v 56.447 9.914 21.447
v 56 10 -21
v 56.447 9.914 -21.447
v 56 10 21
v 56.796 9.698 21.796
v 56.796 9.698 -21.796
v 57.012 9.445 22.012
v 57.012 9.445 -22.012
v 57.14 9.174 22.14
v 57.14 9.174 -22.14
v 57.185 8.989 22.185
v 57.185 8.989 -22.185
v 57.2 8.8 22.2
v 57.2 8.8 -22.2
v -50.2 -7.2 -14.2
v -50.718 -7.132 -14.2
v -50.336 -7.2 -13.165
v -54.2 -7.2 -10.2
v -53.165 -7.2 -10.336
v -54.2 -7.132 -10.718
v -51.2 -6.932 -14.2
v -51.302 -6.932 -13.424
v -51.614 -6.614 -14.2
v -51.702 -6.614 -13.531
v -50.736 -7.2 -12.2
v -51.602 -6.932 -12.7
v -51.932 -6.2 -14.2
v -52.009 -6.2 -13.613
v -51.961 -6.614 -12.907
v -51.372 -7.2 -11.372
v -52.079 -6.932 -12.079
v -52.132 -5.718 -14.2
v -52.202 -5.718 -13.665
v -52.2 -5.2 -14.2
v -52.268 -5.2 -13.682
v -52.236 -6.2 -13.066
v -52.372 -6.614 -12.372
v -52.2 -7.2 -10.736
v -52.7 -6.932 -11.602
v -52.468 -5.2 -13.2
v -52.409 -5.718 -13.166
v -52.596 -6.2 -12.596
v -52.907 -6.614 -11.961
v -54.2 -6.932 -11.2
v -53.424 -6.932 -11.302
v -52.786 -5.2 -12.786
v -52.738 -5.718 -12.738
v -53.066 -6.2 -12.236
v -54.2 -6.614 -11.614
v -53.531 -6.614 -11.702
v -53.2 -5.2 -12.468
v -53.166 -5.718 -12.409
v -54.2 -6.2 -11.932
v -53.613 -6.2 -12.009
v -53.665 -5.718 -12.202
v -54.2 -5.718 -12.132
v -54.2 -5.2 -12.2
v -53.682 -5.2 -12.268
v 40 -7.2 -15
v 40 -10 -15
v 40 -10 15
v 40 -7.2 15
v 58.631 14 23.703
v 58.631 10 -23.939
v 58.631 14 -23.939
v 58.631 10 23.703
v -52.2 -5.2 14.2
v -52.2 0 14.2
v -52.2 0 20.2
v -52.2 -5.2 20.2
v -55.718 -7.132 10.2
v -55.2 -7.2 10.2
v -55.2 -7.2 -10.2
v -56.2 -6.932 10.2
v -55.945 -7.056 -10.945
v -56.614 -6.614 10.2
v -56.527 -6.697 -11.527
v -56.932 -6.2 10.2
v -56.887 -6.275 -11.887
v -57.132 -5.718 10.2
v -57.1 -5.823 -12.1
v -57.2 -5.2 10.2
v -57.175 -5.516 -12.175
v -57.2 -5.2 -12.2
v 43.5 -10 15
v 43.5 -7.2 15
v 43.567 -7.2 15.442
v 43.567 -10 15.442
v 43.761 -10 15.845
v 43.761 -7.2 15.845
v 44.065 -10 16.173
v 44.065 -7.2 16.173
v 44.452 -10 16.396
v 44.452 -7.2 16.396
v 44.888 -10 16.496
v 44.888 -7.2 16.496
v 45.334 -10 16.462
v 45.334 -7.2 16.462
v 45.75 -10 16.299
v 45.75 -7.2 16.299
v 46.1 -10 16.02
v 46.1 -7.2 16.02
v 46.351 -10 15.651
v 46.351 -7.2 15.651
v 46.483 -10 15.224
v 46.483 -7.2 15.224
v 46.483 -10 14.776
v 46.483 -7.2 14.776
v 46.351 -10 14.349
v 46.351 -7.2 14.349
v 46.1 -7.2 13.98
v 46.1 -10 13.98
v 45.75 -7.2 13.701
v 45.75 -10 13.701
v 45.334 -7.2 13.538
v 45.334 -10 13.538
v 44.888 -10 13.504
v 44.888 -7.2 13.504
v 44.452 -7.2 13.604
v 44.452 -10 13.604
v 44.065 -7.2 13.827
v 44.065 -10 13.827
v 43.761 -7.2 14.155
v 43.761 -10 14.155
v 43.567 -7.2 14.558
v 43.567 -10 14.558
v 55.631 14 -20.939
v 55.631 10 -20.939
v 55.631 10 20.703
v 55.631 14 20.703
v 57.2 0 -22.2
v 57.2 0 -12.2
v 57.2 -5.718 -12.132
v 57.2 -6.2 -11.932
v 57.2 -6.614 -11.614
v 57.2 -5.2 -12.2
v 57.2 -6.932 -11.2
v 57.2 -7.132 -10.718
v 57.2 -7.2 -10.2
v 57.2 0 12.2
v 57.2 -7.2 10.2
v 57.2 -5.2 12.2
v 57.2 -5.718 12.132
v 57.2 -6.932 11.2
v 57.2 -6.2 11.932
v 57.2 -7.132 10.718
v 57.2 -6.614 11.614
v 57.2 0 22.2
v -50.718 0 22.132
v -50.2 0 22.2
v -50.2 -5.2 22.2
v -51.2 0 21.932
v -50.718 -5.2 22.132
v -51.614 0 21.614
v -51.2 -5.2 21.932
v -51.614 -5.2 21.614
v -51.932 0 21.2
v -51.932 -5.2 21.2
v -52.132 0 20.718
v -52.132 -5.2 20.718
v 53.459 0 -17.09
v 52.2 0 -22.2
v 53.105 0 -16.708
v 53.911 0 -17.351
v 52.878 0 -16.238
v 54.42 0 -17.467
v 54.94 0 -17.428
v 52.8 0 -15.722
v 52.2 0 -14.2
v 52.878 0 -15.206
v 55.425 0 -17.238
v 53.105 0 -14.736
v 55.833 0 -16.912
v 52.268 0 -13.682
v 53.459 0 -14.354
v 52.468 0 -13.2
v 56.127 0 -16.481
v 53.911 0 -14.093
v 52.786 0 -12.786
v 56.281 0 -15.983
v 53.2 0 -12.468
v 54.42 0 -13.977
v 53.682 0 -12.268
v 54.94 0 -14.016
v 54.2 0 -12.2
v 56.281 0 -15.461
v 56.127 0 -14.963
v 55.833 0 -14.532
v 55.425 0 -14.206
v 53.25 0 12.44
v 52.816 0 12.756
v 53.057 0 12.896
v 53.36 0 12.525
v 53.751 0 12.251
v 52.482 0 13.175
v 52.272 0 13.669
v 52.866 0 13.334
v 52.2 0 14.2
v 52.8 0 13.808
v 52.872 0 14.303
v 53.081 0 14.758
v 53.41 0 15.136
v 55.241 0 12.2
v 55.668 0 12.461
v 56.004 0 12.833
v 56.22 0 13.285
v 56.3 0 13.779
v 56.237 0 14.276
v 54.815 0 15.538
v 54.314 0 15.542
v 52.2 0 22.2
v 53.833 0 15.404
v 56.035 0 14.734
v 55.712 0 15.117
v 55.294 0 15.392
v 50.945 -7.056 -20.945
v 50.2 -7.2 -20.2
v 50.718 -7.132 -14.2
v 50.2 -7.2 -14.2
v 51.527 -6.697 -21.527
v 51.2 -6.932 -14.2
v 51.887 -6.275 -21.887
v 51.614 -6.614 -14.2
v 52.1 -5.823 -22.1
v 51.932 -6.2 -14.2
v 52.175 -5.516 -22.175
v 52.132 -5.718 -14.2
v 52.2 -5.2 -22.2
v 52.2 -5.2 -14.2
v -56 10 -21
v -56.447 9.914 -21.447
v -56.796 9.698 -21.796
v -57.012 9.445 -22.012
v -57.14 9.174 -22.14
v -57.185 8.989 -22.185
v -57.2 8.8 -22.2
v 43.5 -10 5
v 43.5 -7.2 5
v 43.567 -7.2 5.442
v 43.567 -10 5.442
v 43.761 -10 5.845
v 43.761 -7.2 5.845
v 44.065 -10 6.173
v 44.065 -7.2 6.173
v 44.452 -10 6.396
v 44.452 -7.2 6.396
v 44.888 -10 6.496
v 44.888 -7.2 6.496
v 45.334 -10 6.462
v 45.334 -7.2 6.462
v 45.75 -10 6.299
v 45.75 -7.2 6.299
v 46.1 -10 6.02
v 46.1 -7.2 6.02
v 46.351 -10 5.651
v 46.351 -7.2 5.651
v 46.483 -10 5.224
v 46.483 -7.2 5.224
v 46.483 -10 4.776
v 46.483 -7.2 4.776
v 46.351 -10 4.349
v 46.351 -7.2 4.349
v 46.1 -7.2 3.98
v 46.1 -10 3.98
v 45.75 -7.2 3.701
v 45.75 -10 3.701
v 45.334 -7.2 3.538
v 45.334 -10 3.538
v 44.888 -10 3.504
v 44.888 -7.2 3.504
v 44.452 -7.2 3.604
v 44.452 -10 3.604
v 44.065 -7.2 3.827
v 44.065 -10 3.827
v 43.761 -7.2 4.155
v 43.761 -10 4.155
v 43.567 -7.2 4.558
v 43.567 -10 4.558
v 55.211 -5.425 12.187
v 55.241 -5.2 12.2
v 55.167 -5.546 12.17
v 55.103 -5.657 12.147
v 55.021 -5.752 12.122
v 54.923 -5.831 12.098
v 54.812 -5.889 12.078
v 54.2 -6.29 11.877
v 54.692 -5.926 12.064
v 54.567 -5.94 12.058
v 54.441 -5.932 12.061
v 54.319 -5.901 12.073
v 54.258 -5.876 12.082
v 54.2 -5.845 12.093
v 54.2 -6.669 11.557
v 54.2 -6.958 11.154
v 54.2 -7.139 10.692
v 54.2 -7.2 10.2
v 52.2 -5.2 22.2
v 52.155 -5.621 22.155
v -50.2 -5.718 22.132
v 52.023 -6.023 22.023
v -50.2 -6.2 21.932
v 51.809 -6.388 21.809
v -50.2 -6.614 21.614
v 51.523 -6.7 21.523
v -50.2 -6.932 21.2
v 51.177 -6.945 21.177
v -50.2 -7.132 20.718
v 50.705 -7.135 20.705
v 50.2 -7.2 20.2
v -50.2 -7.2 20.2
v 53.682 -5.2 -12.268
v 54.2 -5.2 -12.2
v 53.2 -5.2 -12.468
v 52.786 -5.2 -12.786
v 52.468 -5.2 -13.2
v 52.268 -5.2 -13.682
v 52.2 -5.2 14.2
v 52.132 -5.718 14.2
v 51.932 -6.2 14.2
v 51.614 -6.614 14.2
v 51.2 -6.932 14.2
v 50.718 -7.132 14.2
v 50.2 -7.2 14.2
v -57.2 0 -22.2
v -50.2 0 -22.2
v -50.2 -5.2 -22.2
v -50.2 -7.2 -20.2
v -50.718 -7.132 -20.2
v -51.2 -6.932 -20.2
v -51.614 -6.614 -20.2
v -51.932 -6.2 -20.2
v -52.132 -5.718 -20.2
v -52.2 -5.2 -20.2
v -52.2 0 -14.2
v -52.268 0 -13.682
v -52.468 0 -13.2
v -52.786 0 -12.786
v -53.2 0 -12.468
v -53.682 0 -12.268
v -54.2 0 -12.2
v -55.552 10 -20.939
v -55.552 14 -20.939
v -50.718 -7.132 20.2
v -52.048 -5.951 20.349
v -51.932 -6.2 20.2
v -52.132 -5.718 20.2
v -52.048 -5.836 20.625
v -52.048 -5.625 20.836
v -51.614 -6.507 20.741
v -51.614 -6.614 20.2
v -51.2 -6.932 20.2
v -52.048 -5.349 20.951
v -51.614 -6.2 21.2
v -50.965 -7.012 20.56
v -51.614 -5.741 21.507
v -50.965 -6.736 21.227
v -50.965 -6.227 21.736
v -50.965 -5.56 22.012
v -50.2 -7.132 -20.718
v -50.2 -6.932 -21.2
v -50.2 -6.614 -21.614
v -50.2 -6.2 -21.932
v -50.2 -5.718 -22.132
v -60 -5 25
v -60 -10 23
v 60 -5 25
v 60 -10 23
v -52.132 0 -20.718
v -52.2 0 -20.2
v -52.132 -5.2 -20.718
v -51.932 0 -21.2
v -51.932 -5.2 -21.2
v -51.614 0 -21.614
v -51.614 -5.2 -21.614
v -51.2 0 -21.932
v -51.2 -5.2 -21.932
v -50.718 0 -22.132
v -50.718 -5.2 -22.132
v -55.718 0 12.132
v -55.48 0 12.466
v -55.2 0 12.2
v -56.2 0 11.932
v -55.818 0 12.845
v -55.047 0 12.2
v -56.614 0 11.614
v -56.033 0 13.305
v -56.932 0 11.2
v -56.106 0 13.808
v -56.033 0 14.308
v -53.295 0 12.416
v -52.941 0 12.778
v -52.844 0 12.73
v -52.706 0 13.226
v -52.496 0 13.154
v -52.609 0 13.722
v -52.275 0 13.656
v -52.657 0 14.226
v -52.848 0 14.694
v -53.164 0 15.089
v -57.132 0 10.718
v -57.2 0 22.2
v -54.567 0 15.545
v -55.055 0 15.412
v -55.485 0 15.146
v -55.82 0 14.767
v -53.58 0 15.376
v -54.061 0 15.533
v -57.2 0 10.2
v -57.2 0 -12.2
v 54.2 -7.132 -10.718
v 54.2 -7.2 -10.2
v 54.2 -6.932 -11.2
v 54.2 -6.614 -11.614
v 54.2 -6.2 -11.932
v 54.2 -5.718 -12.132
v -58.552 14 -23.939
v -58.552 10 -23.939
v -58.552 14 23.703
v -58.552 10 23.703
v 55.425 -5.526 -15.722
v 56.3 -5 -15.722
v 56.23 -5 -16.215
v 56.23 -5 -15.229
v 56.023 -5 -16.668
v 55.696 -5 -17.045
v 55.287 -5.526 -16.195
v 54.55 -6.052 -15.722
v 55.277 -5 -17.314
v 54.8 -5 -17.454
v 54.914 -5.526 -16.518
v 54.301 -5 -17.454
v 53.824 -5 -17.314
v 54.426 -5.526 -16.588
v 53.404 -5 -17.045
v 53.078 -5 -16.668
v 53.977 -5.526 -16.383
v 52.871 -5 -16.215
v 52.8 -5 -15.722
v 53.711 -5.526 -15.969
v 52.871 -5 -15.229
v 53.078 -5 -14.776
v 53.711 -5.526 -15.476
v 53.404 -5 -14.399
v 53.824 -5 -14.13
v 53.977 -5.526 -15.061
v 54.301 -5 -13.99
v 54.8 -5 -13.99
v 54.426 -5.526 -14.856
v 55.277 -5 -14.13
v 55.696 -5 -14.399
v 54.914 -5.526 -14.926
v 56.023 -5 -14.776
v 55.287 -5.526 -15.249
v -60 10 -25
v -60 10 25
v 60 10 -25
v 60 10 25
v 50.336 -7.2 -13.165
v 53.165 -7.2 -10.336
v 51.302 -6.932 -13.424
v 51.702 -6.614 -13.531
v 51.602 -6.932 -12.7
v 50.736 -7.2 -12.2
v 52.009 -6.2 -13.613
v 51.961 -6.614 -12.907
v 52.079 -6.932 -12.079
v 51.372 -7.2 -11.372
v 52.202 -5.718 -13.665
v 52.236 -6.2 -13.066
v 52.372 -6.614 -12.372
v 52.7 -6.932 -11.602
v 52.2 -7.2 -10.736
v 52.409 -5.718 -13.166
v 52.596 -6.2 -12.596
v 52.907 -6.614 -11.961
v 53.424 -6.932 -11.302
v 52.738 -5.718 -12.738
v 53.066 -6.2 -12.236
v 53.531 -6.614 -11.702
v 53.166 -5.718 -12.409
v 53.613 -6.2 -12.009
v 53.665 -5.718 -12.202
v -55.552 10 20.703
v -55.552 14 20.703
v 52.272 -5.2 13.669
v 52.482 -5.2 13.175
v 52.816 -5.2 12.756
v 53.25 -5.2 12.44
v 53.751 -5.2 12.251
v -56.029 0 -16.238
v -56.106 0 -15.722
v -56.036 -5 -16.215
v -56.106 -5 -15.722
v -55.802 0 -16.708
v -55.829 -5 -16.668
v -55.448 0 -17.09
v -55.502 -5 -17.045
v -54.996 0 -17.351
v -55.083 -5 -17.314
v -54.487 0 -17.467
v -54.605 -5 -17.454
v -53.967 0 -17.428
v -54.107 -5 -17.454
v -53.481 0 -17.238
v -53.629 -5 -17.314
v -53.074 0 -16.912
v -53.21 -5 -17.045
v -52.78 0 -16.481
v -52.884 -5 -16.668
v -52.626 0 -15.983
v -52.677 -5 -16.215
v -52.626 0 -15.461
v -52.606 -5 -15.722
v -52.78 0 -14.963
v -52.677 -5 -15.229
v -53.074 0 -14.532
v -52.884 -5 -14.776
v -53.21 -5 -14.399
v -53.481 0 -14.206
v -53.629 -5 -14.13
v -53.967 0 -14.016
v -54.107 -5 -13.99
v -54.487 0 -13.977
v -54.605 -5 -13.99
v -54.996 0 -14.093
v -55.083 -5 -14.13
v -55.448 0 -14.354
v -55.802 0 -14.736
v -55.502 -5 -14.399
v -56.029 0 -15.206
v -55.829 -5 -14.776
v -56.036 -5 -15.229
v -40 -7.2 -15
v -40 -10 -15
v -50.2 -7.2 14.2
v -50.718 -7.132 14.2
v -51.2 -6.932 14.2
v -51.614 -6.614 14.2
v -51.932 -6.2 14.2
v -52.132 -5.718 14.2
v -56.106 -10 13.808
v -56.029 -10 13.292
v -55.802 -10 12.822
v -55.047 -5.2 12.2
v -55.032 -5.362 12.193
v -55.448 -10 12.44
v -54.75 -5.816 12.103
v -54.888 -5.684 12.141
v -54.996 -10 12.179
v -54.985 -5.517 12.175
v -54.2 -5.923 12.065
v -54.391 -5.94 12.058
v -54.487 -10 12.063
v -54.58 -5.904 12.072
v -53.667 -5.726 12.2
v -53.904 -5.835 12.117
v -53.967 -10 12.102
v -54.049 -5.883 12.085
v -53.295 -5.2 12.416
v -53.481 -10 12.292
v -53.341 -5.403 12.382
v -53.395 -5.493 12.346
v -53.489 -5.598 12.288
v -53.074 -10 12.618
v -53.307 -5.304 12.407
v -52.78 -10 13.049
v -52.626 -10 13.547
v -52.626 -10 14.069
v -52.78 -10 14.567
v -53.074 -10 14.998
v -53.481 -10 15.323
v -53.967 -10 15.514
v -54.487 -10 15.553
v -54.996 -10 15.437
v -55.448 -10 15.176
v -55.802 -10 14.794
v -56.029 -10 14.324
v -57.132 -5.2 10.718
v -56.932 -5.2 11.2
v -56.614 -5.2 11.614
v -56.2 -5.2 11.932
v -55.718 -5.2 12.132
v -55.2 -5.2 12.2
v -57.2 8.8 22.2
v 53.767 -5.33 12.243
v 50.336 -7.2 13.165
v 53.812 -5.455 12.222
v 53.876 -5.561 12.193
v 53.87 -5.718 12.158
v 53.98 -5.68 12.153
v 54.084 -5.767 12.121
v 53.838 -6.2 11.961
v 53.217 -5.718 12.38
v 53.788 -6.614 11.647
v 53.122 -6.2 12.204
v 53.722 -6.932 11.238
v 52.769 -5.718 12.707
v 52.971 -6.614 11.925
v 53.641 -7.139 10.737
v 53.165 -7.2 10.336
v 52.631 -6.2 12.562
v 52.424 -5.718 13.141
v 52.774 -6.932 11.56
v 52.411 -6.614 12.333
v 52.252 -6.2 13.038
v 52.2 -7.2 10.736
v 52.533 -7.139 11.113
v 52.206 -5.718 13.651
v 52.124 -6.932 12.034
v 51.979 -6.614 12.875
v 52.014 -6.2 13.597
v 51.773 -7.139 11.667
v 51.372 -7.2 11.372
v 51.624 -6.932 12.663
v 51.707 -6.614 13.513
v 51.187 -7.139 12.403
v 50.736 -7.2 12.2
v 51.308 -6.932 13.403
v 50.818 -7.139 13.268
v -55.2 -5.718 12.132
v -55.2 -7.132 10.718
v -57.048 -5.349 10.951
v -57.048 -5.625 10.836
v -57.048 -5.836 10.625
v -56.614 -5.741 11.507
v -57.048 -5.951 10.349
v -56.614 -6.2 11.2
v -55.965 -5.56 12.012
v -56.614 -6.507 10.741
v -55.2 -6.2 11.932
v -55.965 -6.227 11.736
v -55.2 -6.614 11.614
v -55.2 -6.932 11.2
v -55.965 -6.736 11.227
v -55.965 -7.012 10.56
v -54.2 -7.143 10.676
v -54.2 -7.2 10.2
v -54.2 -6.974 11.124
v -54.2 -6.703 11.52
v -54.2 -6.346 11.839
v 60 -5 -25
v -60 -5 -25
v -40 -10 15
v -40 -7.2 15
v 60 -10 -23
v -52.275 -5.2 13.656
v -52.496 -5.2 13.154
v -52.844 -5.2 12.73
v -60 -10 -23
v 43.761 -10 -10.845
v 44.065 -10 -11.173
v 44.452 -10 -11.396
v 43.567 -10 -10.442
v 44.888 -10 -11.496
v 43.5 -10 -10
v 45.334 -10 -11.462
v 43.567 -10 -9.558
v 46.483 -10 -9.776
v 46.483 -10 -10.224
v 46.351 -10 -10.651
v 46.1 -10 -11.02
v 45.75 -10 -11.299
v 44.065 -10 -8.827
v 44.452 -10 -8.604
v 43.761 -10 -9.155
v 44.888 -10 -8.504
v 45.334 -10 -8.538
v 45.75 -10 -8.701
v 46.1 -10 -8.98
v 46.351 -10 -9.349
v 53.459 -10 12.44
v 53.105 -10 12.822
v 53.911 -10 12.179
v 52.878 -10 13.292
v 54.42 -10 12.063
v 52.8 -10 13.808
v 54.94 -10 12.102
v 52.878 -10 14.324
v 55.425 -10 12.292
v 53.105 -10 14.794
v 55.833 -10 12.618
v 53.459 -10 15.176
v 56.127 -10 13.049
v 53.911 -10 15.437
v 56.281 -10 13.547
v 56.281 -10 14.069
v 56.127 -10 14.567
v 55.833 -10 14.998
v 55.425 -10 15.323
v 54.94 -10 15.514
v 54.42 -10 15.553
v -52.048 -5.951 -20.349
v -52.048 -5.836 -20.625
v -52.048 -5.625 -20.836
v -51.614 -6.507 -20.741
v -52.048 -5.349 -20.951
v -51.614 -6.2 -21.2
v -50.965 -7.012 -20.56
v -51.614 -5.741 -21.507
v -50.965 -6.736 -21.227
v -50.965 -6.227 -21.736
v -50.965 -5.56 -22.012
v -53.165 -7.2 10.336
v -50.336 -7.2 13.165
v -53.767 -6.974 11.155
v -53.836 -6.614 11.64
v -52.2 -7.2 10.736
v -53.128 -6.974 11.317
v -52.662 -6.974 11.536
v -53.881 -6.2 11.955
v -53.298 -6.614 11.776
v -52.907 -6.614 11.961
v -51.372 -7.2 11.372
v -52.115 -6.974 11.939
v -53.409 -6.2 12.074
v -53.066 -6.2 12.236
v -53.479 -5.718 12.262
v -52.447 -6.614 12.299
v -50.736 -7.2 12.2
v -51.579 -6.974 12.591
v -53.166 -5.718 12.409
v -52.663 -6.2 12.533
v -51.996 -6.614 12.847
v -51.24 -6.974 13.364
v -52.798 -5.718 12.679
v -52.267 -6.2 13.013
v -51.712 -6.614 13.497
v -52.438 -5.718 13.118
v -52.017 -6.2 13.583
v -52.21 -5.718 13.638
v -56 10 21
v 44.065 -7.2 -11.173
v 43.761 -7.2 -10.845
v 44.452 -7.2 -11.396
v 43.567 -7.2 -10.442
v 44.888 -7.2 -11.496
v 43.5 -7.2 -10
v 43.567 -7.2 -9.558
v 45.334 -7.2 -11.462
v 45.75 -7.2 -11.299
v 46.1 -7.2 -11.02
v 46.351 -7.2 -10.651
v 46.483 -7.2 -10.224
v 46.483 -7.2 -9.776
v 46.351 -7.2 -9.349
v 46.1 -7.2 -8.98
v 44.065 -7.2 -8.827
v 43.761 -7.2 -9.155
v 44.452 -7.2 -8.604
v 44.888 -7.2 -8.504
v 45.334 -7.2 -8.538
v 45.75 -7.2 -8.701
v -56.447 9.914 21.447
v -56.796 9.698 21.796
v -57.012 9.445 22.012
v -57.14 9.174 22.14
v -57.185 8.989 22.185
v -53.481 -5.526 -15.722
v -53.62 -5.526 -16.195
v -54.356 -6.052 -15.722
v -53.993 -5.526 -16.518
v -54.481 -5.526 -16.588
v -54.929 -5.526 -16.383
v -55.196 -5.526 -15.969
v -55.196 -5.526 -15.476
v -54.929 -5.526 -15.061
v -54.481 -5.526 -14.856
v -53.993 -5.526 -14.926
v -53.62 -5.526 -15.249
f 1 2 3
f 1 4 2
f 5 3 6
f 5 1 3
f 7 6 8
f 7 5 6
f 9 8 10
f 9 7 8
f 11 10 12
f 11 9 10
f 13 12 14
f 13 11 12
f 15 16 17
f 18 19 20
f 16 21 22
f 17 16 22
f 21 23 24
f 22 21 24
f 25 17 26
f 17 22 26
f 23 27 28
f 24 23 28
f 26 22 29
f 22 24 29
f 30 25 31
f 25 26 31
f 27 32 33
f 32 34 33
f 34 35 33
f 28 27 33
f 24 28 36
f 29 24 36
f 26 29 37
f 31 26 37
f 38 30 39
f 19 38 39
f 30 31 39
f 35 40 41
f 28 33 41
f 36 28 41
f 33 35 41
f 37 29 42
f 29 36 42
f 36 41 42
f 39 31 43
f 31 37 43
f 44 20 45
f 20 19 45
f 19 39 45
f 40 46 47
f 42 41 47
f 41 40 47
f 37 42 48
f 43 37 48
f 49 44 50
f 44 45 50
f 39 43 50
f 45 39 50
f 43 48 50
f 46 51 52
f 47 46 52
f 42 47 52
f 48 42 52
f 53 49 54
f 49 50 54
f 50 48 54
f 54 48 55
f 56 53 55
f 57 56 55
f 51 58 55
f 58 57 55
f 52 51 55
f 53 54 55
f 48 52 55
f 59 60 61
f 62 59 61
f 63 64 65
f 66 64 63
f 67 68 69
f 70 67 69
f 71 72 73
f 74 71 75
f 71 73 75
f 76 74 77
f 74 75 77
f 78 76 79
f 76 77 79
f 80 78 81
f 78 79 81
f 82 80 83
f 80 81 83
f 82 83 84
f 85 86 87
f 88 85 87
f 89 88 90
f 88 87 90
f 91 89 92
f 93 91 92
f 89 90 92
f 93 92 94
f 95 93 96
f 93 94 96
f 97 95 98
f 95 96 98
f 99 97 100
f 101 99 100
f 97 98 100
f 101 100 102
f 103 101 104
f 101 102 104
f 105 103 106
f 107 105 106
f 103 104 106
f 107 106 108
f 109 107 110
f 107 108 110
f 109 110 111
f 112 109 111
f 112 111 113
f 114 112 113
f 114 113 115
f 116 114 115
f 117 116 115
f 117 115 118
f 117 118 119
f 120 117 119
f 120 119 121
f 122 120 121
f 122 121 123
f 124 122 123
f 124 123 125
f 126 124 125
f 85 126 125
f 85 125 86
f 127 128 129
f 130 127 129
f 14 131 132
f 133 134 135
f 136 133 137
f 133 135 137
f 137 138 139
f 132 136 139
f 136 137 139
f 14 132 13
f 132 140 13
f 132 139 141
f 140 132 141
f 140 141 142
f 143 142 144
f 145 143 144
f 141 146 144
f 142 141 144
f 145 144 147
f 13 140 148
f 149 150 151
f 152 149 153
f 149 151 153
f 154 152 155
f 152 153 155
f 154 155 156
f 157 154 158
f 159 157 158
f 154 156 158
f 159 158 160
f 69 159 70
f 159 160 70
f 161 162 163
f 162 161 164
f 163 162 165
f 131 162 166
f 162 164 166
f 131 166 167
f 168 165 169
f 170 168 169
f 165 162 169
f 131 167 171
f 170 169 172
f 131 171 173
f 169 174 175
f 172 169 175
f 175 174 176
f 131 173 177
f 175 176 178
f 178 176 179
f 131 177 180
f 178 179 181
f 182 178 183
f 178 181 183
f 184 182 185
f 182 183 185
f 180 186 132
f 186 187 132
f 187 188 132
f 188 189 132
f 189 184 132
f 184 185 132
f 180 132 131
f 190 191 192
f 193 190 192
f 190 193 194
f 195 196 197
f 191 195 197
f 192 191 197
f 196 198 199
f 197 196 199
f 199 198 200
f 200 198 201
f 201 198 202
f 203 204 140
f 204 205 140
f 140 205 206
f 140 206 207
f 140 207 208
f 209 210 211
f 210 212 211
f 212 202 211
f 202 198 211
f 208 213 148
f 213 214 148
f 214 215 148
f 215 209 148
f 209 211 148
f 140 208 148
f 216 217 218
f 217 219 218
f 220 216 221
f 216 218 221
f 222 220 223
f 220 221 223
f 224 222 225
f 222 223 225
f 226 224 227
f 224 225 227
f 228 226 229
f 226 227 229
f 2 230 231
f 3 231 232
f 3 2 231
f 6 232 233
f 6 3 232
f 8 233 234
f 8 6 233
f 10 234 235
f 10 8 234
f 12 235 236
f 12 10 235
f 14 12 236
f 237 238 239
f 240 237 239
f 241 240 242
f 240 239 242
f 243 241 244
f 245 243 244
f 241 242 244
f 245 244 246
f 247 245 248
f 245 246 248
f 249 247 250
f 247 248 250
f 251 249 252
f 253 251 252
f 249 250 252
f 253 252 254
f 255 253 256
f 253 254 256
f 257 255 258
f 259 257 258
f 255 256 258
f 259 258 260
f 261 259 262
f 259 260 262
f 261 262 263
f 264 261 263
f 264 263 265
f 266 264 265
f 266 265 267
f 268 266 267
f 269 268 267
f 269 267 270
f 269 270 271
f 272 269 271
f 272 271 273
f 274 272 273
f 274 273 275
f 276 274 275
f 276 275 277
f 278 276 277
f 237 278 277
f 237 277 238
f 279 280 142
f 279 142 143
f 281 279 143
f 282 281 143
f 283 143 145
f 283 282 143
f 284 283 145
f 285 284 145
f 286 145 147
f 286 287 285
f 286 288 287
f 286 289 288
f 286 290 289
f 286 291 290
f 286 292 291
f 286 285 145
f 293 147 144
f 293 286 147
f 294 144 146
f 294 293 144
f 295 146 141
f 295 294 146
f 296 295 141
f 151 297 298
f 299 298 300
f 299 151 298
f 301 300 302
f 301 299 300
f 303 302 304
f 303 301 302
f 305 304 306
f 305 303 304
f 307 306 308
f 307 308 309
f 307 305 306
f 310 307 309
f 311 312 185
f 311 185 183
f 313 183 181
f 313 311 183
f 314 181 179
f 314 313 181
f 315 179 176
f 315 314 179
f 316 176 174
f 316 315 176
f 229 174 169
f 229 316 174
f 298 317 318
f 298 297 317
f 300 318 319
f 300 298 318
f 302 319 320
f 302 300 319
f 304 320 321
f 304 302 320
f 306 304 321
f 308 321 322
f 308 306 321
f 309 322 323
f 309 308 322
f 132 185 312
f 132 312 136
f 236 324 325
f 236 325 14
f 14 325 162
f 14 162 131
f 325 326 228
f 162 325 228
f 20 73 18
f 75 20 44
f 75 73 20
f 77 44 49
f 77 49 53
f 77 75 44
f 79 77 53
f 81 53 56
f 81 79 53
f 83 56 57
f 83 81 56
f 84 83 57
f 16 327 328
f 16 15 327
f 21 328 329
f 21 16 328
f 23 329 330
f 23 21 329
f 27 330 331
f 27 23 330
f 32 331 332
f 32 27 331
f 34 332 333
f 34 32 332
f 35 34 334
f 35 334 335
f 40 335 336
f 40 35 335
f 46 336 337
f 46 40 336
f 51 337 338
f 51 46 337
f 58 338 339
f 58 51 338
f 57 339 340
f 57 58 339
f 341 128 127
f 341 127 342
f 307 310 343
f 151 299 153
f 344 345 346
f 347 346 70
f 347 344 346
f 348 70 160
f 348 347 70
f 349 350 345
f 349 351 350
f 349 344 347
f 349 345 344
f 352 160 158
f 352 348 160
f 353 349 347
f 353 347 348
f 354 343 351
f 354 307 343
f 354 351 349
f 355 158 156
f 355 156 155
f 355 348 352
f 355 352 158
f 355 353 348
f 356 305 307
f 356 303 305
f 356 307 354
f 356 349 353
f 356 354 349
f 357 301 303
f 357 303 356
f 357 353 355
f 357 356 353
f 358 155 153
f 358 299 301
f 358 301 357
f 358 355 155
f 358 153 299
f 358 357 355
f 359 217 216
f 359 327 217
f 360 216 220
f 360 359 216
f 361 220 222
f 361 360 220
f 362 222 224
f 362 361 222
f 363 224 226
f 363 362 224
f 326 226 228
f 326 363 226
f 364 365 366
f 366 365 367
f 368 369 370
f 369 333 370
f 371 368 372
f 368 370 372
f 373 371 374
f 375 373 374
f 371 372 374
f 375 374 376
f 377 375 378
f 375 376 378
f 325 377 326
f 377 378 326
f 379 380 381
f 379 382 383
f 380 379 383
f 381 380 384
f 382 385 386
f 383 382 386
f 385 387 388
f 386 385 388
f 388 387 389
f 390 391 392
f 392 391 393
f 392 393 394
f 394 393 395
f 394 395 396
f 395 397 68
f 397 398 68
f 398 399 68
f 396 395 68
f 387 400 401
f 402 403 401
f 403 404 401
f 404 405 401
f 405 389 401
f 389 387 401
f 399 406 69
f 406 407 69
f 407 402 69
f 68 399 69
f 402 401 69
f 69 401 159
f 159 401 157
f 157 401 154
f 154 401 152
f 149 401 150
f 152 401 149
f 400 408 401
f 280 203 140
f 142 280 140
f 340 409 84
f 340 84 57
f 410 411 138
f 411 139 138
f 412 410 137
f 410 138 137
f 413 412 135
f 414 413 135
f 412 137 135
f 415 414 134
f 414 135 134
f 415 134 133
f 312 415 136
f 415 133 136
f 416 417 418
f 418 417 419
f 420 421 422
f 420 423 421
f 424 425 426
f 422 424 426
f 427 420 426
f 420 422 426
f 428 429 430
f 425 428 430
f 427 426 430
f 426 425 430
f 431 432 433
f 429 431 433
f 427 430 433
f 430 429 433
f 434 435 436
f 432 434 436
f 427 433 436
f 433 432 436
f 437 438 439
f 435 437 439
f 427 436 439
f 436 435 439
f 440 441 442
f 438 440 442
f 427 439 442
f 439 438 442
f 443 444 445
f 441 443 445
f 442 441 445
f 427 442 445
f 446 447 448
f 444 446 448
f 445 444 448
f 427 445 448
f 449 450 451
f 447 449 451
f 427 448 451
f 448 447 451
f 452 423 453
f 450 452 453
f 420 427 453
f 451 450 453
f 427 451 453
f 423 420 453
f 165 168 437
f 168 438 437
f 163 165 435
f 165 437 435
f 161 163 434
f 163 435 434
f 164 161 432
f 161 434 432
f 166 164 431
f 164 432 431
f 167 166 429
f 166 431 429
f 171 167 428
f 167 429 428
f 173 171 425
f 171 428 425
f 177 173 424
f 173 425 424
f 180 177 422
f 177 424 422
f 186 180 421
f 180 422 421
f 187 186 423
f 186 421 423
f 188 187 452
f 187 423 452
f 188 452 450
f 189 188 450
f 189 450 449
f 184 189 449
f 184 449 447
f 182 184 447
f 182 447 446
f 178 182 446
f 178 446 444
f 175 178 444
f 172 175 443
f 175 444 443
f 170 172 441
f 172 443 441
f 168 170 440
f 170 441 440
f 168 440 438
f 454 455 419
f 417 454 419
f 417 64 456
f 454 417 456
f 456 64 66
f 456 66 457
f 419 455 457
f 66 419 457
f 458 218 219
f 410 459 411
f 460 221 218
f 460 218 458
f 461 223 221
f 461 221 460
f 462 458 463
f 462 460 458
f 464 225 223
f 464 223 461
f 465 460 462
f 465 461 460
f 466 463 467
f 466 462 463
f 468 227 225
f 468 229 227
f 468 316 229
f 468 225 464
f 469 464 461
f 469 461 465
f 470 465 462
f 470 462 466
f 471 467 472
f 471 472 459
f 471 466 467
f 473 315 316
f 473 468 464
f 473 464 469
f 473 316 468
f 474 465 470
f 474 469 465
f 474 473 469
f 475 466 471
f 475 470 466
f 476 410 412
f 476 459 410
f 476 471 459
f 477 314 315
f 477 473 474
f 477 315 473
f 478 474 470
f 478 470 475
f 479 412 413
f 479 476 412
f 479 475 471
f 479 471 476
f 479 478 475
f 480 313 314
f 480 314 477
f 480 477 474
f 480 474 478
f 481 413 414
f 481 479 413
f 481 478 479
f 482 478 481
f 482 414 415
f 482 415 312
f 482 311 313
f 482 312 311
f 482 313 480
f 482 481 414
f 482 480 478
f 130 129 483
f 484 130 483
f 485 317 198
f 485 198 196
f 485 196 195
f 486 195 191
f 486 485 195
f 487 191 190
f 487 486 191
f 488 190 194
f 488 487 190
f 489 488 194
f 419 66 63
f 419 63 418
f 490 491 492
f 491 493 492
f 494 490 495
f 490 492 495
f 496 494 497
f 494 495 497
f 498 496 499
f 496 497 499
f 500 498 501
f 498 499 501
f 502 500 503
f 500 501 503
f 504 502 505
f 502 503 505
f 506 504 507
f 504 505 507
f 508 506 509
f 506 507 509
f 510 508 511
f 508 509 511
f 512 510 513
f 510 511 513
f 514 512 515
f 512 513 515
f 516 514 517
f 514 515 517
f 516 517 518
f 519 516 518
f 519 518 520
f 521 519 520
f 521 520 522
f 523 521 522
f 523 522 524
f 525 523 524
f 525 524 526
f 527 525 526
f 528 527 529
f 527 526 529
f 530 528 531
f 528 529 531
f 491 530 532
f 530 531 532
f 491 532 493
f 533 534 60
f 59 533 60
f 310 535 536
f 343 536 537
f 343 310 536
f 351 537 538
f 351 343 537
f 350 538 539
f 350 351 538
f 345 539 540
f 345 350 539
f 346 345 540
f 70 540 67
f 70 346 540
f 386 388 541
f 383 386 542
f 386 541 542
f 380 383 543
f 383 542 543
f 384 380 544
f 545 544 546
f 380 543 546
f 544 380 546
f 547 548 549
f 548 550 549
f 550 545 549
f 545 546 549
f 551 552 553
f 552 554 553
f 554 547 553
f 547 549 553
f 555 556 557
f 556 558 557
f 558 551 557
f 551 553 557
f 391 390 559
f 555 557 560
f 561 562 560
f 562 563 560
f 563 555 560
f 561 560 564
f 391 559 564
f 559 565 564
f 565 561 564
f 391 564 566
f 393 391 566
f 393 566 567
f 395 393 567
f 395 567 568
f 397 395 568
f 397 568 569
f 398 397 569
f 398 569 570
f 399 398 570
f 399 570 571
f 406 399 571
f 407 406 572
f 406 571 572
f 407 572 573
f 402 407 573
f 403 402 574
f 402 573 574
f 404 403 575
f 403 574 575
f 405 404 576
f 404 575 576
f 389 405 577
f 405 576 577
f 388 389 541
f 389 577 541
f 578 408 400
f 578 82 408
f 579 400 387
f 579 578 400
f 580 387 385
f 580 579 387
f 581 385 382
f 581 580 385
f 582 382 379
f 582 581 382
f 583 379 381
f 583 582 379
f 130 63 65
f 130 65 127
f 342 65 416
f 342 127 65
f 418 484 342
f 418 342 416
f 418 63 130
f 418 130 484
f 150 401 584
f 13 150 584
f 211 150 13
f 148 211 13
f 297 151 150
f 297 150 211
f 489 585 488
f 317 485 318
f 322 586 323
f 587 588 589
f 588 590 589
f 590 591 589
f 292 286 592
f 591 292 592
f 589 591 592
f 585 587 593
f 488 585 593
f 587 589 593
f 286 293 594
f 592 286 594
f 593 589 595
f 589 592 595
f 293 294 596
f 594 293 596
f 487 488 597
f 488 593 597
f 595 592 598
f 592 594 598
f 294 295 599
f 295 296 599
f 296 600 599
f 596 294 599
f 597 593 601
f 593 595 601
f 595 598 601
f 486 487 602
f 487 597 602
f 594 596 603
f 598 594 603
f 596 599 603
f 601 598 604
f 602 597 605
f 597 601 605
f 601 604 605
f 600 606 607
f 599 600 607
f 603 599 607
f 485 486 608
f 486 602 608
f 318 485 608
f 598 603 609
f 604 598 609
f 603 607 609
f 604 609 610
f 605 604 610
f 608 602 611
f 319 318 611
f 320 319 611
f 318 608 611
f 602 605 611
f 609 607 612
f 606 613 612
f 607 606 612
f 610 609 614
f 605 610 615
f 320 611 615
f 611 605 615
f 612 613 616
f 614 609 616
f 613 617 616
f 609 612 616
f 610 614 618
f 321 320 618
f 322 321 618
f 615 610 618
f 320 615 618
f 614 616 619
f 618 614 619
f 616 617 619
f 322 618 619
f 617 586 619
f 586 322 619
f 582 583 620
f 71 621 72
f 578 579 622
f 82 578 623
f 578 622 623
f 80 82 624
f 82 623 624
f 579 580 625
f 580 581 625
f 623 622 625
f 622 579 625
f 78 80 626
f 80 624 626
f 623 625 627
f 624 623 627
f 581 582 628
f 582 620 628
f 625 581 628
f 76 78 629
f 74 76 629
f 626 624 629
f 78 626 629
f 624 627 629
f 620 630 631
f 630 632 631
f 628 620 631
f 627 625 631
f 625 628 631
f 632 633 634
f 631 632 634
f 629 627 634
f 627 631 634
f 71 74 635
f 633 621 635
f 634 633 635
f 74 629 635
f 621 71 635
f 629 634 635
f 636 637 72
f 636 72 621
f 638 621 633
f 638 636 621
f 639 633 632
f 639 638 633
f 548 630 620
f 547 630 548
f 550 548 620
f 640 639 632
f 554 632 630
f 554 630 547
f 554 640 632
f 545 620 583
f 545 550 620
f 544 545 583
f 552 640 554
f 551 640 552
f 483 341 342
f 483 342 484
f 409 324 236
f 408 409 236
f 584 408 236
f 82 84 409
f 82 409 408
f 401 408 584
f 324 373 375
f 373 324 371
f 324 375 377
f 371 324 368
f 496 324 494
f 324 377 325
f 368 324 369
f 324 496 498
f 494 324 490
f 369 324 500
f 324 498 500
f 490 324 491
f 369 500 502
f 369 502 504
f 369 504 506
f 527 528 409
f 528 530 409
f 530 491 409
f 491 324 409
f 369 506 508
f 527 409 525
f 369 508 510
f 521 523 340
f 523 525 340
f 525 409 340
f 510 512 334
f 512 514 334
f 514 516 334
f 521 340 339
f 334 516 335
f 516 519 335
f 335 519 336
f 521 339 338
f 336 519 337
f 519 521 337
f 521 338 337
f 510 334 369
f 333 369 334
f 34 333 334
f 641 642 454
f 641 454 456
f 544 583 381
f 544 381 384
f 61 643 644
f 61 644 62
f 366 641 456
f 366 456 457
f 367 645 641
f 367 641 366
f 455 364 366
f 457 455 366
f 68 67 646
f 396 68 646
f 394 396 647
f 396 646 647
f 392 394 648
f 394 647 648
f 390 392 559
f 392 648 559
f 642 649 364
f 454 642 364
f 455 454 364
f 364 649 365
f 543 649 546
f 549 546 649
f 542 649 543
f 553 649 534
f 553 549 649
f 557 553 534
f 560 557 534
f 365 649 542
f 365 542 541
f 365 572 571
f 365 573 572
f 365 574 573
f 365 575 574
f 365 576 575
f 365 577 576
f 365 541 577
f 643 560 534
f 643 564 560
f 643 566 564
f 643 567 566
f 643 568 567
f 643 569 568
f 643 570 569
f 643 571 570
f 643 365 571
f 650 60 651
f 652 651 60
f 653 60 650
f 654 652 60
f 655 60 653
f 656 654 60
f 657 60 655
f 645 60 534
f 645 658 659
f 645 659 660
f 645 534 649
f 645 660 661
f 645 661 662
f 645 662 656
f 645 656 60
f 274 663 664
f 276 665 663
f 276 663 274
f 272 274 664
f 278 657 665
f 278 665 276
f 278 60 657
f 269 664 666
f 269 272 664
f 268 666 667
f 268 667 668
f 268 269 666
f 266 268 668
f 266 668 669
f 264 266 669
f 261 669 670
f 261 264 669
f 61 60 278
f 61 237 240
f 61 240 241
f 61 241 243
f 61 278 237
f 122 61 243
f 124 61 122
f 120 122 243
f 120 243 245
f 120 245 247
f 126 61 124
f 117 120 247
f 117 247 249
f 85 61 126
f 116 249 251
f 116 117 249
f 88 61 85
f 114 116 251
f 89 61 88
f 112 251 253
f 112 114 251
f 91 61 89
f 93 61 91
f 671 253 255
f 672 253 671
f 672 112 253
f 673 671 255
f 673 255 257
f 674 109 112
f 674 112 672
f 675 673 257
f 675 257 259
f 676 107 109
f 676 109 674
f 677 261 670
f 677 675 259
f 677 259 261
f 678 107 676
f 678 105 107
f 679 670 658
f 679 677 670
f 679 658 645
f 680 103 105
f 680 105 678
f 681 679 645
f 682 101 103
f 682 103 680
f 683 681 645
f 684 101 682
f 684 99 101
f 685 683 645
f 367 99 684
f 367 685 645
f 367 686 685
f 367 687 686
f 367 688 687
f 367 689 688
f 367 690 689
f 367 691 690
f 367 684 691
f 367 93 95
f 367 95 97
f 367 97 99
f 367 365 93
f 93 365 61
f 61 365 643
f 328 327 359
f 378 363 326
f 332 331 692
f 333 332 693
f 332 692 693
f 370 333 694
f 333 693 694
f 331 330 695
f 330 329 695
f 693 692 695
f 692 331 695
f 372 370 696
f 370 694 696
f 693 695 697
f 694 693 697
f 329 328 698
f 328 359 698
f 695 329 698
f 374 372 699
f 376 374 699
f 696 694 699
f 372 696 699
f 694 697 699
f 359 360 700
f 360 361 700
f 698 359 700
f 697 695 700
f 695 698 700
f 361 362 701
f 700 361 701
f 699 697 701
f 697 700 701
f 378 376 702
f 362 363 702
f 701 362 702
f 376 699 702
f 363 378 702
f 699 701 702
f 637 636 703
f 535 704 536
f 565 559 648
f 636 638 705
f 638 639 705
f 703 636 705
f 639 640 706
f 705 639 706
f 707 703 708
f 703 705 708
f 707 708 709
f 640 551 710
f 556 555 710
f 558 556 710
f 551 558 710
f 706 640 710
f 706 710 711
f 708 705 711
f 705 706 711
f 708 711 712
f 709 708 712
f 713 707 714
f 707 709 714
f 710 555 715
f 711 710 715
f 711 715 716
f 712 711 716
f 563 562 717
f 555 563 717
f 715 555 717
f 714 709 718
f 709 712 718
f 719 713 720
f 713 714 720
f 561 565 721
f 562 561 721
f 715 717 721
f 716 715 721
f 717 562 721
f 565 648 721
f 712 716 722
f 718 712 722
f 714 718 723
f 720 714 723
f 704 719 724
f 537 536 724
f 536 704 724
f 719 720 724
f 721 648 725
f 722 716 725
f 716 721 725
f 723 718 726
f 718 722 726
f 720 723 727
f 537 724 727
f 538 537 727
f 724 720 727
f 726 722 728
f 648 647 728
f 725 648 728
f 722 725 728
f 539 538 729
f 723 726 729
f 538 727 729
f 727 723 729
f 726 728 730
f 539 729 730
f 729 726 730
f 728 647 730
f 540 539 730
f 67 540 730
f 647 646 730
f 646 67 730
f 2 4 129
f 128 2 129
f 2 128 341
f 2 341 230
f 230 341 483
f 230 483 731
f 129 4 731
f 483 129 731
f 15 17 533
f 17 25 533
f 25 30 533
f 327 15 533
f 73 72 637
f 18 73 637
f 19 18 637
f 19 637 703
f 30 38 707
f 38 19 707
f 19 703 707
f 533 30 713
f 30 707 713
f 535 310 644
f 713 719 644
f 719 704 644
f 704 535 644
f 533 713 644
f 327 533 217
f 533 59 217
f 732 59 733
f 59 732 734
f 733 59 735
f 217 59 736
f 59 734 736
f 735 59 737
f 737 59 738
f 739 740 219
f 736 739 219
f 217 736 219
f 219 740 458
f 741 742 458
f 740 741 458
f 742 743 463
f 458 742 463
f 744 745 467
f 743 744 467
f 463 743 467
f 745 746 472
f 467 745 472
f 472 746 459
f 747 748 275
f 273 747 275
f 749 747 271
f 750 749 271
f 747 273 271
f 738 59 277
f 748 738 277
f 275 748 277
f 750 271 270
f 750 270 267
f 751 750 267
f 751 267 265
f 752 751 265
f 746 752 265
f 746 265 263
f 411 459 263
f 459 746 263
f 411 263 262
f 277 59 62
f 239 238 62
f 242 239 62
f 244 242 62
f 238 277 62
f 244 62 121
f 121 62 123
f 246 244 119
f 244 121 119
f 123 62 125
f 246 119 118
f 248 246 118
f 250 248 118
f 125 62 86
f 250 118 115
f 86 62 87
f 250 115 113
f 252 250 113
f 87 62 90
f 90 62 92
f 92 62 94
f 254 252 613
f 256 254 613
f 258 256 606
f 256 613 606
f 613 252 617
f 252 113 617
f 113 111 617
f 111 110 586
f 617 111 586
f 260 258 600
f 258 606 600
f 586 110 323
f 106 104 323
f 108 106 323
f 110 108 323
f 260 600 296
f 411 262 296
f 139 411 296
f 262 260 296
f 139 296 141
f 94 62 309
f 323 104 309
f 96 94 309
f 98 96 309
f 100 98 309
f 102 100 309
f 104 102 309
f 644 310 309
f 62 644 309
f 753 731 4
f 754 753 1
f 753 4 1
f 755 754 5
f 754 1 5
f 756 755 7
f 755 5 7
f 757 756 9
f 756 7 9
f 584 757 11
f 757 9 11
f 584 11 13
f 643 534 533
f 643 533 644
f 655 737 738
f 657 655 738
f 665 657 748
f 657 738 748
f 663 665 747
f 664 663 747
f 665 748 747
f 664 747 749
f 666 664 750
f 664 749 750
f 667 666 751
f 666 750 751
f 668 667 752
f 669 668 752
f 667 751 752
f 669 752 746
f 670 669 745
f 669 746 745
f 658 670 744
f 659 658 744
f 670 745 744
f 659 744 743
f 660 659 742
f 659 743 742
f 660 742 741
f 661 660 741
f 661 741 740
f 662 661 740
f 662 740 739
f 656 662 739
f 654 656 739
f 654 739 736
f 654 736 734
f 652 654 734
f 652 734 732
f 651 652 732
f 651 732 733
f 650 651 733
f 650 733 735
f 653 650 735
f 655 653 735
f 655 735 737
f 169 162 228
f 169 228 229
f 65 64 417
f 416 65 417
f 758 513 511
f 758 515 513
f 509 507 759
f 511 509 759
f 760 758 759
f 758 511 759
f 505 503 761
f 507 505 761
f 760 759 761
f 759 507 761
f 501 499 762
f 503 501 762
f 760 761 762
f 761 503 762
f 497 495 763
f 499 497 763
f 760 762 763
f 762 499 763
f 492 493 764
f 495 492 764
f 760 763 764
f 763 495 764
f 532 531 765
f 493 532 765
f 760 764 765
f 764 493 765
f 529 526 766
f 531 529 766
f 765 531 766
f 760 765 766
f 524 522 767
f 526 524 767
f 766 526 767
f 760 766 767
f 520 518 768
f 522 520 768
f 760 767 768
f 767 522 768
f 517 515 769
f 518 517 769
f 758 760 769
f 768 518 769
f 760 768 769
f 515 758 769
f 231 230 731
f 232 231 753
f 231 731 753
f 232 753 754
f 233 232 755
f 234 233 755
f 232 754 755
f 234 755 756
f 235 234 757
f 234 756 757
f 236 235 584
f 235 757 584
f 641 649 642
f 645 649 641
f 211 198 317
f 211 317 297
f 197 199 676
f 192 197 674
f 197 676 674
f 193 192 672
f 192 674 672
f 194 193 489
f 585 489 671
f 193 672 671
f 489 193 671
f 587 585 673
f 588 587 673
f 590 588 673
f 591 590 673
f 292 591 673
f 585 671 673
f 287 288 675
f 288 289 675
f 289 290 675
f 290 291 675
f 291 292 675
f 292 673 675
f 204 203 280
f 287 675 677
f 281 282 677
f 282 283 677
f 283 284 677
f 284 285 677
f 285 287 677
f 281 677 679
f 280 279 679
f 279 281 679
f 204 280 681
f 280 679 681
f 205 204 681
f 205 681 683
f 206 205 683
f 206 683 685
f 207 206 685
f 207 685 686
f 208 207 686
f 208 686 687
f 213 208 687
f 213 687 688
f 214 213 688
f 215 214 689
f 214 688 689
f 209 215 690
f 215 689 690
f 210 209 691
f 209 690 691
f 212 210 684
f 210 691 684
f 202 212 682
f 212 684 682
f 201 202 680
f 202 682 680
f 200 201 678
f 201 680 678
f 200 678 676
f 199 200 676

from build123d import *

# Parameters (mm, degrees)
F0_W          = 120
F0_H          = 50
F1_DEPTH      = 10
F1_DEPTH_BACK = 10
F2_T          = -2.8
F3_W          = 80
F3_H          = 30
F4_DEPTH      = 20.001
F6_W          = 5
F6_H          = 10
F7_DEPTH      = 7.2
F8_F1_R       = 2
F8_F2_R       = 2
F9_SIZE2      = 2
F9_SIZE       = 5
F9_2_SIZE2    = 2
F9_2_SIZE     = 5
F10_D         = 3
F12_D         = 3.5
F12_DEPTH     = 5
F12_START     = 5.9405501
F12_TIP       = 1.0515060833
F13_W         = 117.182782799
F13_H         = 47.6424540132
F13_W_2       = 111.182782799
F13_H_2       = 41.6424540132
F14_DEPTH     = 4
F15_R         = 1.2


with BuildPart() as f1:
    # F0 (on Front) → F1 (new body, two sides)
    with BuildSketch(Plane.XZ) as f1_sk:
        Rectangle(F0_W, F0_H)
    extrude(amount=F1_DEPTH)
    extrude(f1_sk.sketch, amount=-F1_DEPTH_BACK)

    # F2
    f2_openings = [f1.faces().sort_by_distance(p)[0] for p in [
        (0, 10, 0),
    ]]
    offset(amount=F2_T, openings=f2_openings)

    # F3 (on face) → F4 (cut, through all)
    with BuildSketch(Plane.XZ.offset(10)):
        Rectangle(F3_W, F3_H)
    extrude(amount=-F4_DEPTH, mode=Mode.SUBTRACT)

    # F6 (on Front) → F7 (join, through all)
    with BuildSketch(Plane.XZ):
        with Locations((54.7, 17.2)):
            Rectangle(F6_W, F6_H)
        with Locations((54.7, -17.2)):
            Rectangle(F6_W, F6_H)
        with Locations((-54.7, 17.2)):
            Rectangle(F6_W, F6_H)
        with Locations((-54.7, -17.2)):
            Rectangle(F6_W, F6_H)
    extrude(amount=F7_DEPTH)

    # F8: fillet of radius 2 on 14 edges, made by hand

    # F8_f1
    f8_f1_edges = [f1.edges().sort_by_distance(p)[0] for p in [
        (52.2, -3.6, 12.2),
        (-52.2, -3.6, 12.2),
        (-52.2, -3.6, -12.2),
        (52.2, -3.6, -12.2),
    ]]
    fillet(f8_f1_edges, radius=F8_F1_R)

    # F8_f2
    f8_f2_edges = [f1.edges().sort_by_distance(p)[0] for p in [
        (52.2, -7.2, -18.2),
        (52.2, -7.2, 18.2),
        (0, -7.2, 22.2),
        (-52.2, -7.2, 18.2),
        (-52.2, -3.6, 22.2),
        (-57.2, -3.6, 12.2),
        (-57.2, -7.2, 0),
        (0, -7.2, -22.2),
        (-52.2, -7.2, -18.2),
        (-52.2, -3.6, -22.2),
        (-52.7857864376, -7.2, -12.7857864376),
        (-52.7857864376, -7.2, 12.7857864376),
        (52.7857864376, -7.2, 12.7857864376),
        (52.7857864376, -7.2, -12.7857864376),
    ]]
    fillet(f8_f2_edges, radius=F8_F2_R)

    # F9
    f9_edges = [f1.edges().sort_by_distance(p)[0] for p in [
        (0, -10, -25),
    ]]
    f9_side = f1.faces().sort_by_distance((0, 0, -25))[0]
    chamfer(f9_edges, length=F9_SIZE, length2=F9_SIZE2, reference=f9_side)

    # F9#2
    f9_2_edges = [f1.edges().sort_by_distance(p)[0] for p in [
        (0, -10, 25),
    ]]
    f9_2_side = f1.faces().sort_by_distance((0, 0, 25))[0]
    chamfer(f9_2_edges, length=F9_2_SIZE, length2=F9_2_SIZE2, reference=f9_2_side)

    # F10 (through all)
    with Locations(Plane.XZ.offset(10)):
        with Locations((45, 5), (45, 15), (45, -10)):
            Hole(F10_D / 2)

    # F12
    # its depths count from where the whole tool has entered the part; down to there all is cleared
    with Locations(Plane(origin=(0, 0, 0), x_dir=(1, 0, 0), z_dir=(0, 1, 0))):
        with Locations((54.5504838228, -13.8078443706), (-54.356444627, -13.8078443706)):
            Hole(F12_D / 2, depth=F12_START)
    with Locations(Plane(origin=(0, 0, 0), x_dir=(1, 0, 0), z_dir=(0, 1, 0))):
        with Locations((54.5504838228, -13.8078443706, -F12_START), (-54.356444627, -13.8078443706, -F12_START), (-54.356444627, 15.7220419496, 0), (54.5504838228, 15.7220419496, 0)):
            Hole(F12_D / 2, depth=F12_DEPTH)
            with Locations((0, 0, -(F12_DEPTH + F12_TIP / 2))):  # 118° drill point
                Cone(0, F12_D / 2, F12_TIP, mode=Mode.SUBTRACT)

    # F13 (on face) → F14 (join)
    with BuildSketch(Plane(origin=(0, 10, 0), x_dir=(-1, 0, 0), z_dir=(0, 1, 0))):
        with Locations((-0.0398587435, -0.1178945079)):
            Rectangle(F13_W, F13_H)
        with Locations((-0.0398587435, -0.1178945079)):
            Rectangle(F13_W_2, F13_H_2, mode=Mode.SUBTRACT)
    extrude(amount=F14_DEPTH)

    # F15
    f15_edges = [f1.edges().sort_by_distance(p)[0] for p in [
        (0, 10, 22.2),
        (-57.2, 10, 0),
        (0, 10, -22.2),
        (57.2, 10, 0),
    ]]
    fillet(f15_edges, radius=F15_R)


solid = f1.part
